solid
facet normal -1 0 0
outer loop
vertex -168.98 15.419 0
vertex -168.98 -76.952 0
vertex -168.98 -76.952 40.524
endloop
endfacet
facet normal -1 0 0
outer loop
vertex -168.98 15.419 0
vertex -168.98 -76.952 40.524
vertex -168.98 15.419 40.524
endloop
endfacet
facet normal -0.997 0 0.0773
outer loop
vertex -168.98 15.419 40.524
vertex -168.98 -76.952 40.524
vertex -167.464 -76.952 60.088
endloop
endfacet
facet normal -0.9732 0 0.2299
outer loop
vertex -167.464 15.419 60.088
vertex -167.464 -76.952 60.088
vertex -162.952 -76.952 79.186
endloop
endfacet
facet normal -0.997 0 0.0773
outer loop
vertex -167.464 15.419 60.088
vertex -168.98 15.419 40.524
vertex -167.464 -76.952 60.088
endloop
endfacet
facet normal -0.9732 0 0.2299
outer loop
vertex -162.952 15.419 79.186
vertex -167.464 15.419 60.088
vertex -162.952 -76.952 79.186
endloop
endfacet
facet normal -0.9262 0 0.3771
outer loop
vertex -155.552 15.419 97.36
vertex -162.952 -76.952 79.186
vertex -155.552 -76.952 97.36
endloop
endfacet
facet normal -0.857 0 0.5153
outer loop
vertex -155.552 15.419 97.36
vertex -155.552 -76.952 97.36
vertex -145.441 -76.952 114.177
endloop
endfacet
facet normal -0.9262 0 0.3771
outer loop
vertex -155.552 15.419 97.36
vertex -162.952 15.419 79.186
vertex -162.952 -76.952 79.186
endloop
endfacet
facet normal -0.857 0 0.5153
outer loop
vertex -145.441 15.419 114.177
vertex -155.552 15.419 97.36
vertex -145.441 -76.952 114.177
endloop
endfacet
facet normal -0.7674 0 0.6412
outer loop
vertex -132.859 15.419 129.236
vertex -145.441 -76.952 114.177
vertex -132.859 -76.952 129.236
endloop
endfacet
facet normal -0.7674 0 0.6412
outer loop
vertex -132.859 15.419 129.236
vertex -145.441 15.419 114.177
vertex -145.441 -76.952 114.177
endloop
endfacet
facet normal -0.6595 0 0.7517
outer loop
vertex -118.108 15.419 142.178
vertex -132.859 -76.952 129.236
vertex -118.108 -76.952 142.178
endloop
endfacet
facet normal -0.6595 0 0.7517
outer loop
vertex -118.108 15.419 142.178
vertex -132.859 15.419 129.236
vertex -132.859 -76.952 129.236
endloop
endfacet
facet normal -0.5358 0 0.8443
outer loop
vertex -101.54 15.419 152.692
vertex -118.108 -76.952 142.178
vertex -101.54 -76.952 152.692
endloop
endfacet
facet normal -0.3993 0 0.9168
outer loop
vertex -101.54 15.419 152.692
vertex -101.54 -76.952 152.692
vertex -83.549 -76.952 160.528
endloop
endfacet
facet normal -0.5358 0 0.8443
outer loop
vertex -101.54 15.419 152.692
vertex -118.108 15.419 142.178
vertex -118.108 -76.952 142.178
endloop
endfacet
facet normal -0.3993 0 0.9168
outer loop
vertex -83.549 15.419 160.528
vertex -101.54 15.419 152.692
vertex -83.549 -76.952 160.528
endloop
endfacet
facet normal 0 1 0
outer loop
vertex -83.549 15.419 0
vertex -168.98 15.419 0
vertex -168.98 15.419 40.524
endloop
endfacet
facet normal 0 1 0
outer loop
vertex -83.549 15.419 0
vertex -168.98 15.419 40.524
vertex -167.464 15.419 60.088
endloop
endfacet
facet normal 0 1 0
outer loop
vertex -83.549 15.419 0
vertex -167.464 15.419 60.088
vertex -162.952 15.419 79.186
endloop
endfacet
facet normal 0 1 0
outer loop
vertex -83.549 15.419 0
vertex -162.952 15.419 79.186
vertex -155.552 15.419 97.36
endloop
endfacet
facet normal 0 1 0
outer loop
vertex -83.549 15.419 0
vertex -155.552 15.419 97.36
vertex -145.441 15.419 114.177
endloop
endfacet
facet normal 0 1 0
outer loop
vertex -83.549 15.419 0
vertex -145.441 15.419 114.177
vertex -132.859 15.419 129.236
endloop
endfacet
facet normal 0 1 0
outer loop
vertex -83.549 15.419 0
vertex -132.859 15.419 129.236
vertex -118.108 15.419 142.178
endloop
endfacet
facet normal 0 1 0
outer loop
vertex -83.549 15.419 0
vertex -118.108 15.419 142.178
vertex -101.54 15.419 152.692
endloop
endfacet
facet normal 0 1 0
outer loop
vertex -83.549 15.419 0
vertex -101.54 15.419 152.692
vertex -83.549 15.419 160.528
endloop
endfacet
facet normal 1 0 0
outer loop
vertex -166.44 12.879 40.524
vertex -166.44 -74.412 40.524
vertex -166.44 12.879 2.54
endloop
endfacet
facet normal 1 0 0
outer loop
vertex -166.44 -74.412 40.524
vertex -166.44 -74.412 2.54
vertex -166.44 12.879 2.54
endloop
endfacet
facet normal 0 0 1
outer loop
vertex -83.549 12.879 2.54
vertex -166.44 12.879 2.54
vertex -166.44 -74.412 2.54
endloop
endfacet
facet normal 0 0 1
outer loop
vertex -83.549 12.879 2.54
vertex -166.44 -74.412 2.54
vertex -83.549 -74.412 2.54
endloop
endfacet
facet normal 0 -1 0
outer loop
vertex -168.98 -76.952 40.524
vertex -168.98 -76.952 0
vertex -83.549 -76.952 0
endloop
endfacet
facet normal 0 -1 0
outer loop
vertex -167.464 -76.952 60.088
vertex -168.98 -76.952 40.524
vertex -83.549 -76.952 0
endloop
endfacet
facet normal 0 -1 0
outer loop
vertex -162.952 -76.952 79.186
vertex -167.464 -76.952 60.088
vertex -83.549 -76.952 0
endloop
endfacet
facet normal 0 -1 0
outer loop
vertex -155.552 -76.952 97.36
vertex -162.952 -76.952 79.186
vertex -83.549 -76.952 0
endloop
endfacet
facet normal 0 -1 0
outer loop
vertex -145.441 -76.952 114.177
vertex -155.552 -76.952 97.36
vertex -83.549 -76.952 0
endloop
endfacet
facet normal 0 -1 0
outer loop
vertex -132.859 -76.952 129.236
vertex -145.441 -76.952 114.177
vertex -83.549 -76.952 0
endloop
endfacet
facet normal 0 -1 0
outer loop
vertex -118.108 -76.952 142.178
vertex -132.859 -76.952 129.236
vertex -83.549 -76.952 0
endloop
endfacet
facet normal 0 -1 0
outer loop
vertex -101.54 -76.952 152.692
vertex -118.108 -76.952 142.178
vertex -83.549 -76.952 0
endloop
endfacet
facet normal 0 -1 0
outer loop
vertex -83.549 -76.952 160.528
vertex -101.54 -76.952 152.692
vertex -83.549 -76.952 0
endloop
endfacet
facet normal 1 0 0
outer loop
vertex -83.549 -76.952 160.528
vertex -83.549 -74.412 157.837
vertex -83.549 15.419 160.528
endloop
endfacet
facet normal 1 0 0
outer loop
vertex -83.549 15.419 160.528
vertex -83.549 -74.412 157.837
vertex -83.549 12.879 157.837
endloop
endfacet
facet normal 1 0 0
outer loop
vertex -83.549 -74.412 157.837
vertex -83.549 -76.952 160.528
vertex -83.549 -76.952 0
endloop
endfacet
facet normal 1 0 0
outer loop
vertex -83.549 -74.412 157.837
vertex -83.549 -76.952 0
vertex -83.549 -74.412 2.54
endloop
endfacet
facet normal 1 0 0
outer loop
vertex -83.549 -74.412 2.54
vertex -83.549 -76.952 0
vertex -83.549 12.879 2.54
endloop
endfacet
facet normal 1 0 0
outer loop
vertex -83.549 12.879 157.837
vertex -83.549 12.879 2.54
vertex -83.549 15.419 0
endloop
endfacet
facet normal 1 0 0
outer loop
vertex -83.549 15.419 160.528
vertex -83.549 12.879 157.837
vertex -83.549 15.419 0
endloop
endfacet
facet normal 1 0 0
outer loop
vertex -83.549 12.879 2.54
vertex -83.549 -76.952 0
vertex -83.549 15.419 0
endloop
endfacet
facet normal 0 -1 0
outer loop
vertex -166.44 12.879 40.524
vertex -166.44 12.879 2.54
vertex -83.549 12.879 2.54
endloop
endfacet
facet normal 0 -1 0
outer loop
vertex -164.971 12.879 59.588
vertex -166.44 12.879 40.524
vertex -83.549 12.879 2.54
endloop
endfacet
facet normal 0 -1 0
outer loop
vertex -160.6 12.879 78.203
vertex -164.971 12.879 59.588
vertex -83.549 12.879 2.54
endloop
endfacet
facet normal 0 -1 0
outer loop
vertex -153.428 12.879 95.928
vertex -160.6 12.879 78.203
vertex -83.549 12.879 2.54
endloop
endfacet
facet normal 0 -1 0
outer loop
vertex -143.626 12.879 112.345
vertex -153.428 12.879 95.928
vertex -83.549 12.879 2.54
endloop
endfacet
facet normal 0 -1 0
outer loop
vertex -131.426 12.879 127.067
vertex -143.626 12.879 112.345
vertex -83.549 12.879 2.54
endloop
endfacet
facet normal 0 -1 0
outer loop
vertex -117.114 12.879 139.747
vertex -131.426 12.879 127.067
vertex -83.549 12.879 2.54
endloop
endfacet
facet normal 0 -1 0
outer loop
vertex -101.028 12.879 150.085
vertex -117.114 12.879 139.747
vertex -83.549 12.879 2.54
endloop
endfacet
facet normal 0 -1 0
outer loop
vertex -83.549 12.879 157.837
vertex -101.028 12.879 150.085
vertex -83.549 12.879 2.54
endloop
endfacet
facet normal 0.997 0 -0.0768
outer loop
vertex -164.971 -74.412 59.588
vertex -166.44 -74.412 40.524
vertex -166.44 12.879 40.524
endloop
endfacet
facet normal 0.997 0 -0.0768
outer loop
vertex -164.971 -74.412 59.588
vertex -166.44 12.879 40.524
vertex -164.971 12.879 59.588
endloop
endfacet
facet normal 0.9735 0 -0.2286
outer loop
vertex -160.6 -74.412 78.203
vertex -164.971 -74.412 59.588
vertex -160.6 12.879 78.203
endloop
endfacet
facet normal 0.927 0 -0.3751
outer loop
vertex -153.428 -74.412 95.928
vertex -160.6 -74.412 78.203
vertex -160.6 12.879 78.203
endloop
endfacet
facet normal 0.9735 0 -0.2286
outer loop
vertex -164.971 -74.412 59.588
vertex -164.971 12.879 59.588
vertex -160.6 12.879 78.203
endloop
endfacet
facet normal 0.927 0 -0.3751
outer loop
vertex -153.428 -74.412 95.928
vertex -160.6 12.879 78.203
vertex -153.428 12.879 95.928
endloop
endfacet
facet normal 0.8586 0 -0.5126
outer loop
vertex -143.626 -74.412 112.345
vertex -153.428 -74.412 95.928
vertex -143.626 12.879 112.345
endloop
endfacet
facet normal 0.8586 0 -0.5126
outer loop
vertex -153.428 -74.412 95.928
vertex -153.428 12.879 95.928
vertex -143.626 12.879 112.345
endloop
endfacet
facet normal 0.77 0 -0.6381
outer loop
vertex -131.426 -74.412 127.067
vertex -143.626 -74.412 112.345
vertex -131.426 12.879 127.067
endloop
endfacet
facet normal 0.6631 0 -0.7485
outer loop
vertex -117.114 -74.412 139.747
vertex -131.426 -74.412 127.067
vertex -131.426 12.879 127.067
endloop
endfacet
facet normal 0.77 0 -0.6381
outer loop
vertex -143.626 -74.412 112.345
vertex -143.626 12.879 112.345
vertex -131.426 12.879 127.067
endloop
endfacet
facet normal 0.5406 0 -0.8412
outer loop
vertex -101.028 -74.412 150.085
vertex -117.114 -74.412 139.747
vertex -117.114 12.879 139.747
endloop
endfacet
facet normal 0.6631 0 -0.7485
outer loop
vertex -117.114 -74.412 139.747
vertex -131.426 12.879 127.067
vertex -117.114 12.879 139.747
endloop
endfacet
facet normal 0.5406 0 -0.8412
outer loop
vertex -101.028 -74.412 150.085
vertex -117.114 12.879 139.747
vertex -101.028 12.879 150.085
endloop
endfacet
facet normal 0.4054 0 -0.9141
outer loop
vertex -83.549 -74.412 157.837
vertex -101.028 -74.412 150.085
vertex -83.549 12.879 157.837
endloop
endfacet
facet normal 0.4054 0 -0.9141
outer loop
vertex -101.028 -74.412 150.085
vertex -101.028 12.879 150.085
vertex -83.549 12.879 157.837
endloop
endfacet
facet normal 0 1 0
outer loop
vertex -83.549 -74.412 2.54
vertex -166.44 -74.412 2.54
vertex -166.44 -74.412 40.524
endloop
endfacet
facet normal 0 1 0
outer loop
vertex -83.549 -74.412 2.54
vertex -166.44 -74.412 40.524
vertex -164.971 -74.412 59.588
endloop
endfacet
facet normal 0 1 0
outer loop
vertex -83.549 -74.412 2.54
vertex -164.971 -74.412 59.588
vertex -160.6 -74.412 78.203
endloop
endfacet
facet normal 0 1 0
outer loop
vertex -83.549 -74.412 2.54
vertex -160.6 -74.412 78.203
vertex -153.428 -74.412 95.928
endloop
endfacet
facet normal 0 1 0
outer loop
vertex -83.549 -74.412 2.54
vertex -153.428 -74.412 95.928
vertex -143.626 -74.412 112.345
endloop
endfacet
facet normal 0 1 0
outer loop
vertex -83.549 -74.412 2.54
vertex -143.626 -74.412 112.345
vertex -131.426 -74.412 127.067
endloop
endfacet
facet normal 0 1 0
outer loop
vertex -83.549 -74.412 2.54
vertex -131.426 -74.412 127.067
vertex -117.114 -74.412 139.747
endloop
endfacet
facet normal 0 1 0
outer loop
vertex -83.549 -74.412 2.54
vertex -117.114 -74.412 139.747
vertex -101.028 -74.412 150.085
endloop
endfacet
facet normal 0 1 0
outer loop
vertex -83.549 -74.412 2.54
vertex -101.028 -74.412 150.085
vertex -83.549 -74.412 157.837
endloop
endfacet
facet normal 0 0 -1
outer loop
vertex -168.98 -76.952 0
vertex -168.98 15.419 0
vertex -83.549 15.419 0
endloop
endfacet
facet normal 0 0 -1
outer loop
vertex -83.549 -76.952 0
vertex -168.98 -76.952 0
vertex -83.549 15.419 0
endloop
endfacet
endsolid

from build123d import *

# Parameters (mm, degrees)
F0_W        = 85.4306071997
F0_H        = 92.3714498058
F1_DEPTH    = 160.528
F2_T1_DEPTH = 692.3919824172
F3_T        = -2.54


# Not quite as in the source:
# - a fillet or chamfer that OpenCascade refuses, or shapes differently, is made with other operations: its cross-section is extruded or revolved along the edge and cut away or added


with BuildPart() as f1:
    # F0 (on Top) → F1 (new body)
    with BuildSketch(Plane.XY):
        with Locations((-126.2646093965, -30.766769778)):
            Rectangle(F0_W, F0_H)
    extrude(amount=F1_DEPTH)

    # F2: fillet of radius 127 on 1 edges, made by hand

    # F2_s2 → F2_t1 (cut)
    with BuildSketch(Plane.XZ.offset(-315.4292214306)):
        with BuildLine():
            ThreePointArc((-168.9799129963, 40.5238934777), (-145.4408062982, 114.1774307803), (-83.5493057966, 160.528))
            Line((-83.5493057966, 160.528), (-168.9799129963, 160.528))
            Line((-168.9799129963, 160.528), (-168.9799129963, 40.5238934777))
        make_face()
    extrude(amount=F2_T1_DEPTH, mode=Mode.SUBTRACT)

    # F3
    f3_openings = [f1.faces().sort_by_distance(p)[0] for p in [
        (-83.549306, -30.76677, 80.264),
    ]]
    offset(amount=F3_T, openings=f3_openings)


solid = f1.part
